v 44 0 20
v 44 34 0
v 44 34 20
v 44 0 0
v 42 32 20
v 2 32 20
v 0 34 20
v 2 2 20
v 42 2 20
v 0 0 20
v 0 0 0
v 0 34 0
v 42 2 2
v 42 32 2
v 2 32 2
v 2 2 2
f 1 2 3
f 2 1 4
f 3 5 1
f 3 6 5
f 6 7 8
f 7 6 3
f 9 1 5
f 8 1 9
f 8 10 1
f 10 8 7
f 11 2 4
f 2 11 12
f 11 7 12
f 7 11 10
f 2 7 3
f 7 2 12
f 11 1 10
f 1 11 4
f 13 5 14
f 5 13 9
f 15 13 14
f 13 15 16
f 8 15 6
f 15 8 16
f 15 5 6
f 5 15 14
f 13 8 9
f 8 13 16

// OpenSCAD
// lattice's new scad page: a box with a lid, three customizer variables
/* [Size] */
// inside width, in mm
width = 40; // [10:200]
// inside depth, in mm
depth = 30; // [10:200]
// wall thickness, in mm
wall = 2; // [0.8:0.2:6]

/* [Hidden] */
$fn = 48;

difference() {
  cube([width + 2 * wall, depth + 2 * wall, 20]);
  translate([wall, wall, wall]) cube([width, depth, 20]);
}
